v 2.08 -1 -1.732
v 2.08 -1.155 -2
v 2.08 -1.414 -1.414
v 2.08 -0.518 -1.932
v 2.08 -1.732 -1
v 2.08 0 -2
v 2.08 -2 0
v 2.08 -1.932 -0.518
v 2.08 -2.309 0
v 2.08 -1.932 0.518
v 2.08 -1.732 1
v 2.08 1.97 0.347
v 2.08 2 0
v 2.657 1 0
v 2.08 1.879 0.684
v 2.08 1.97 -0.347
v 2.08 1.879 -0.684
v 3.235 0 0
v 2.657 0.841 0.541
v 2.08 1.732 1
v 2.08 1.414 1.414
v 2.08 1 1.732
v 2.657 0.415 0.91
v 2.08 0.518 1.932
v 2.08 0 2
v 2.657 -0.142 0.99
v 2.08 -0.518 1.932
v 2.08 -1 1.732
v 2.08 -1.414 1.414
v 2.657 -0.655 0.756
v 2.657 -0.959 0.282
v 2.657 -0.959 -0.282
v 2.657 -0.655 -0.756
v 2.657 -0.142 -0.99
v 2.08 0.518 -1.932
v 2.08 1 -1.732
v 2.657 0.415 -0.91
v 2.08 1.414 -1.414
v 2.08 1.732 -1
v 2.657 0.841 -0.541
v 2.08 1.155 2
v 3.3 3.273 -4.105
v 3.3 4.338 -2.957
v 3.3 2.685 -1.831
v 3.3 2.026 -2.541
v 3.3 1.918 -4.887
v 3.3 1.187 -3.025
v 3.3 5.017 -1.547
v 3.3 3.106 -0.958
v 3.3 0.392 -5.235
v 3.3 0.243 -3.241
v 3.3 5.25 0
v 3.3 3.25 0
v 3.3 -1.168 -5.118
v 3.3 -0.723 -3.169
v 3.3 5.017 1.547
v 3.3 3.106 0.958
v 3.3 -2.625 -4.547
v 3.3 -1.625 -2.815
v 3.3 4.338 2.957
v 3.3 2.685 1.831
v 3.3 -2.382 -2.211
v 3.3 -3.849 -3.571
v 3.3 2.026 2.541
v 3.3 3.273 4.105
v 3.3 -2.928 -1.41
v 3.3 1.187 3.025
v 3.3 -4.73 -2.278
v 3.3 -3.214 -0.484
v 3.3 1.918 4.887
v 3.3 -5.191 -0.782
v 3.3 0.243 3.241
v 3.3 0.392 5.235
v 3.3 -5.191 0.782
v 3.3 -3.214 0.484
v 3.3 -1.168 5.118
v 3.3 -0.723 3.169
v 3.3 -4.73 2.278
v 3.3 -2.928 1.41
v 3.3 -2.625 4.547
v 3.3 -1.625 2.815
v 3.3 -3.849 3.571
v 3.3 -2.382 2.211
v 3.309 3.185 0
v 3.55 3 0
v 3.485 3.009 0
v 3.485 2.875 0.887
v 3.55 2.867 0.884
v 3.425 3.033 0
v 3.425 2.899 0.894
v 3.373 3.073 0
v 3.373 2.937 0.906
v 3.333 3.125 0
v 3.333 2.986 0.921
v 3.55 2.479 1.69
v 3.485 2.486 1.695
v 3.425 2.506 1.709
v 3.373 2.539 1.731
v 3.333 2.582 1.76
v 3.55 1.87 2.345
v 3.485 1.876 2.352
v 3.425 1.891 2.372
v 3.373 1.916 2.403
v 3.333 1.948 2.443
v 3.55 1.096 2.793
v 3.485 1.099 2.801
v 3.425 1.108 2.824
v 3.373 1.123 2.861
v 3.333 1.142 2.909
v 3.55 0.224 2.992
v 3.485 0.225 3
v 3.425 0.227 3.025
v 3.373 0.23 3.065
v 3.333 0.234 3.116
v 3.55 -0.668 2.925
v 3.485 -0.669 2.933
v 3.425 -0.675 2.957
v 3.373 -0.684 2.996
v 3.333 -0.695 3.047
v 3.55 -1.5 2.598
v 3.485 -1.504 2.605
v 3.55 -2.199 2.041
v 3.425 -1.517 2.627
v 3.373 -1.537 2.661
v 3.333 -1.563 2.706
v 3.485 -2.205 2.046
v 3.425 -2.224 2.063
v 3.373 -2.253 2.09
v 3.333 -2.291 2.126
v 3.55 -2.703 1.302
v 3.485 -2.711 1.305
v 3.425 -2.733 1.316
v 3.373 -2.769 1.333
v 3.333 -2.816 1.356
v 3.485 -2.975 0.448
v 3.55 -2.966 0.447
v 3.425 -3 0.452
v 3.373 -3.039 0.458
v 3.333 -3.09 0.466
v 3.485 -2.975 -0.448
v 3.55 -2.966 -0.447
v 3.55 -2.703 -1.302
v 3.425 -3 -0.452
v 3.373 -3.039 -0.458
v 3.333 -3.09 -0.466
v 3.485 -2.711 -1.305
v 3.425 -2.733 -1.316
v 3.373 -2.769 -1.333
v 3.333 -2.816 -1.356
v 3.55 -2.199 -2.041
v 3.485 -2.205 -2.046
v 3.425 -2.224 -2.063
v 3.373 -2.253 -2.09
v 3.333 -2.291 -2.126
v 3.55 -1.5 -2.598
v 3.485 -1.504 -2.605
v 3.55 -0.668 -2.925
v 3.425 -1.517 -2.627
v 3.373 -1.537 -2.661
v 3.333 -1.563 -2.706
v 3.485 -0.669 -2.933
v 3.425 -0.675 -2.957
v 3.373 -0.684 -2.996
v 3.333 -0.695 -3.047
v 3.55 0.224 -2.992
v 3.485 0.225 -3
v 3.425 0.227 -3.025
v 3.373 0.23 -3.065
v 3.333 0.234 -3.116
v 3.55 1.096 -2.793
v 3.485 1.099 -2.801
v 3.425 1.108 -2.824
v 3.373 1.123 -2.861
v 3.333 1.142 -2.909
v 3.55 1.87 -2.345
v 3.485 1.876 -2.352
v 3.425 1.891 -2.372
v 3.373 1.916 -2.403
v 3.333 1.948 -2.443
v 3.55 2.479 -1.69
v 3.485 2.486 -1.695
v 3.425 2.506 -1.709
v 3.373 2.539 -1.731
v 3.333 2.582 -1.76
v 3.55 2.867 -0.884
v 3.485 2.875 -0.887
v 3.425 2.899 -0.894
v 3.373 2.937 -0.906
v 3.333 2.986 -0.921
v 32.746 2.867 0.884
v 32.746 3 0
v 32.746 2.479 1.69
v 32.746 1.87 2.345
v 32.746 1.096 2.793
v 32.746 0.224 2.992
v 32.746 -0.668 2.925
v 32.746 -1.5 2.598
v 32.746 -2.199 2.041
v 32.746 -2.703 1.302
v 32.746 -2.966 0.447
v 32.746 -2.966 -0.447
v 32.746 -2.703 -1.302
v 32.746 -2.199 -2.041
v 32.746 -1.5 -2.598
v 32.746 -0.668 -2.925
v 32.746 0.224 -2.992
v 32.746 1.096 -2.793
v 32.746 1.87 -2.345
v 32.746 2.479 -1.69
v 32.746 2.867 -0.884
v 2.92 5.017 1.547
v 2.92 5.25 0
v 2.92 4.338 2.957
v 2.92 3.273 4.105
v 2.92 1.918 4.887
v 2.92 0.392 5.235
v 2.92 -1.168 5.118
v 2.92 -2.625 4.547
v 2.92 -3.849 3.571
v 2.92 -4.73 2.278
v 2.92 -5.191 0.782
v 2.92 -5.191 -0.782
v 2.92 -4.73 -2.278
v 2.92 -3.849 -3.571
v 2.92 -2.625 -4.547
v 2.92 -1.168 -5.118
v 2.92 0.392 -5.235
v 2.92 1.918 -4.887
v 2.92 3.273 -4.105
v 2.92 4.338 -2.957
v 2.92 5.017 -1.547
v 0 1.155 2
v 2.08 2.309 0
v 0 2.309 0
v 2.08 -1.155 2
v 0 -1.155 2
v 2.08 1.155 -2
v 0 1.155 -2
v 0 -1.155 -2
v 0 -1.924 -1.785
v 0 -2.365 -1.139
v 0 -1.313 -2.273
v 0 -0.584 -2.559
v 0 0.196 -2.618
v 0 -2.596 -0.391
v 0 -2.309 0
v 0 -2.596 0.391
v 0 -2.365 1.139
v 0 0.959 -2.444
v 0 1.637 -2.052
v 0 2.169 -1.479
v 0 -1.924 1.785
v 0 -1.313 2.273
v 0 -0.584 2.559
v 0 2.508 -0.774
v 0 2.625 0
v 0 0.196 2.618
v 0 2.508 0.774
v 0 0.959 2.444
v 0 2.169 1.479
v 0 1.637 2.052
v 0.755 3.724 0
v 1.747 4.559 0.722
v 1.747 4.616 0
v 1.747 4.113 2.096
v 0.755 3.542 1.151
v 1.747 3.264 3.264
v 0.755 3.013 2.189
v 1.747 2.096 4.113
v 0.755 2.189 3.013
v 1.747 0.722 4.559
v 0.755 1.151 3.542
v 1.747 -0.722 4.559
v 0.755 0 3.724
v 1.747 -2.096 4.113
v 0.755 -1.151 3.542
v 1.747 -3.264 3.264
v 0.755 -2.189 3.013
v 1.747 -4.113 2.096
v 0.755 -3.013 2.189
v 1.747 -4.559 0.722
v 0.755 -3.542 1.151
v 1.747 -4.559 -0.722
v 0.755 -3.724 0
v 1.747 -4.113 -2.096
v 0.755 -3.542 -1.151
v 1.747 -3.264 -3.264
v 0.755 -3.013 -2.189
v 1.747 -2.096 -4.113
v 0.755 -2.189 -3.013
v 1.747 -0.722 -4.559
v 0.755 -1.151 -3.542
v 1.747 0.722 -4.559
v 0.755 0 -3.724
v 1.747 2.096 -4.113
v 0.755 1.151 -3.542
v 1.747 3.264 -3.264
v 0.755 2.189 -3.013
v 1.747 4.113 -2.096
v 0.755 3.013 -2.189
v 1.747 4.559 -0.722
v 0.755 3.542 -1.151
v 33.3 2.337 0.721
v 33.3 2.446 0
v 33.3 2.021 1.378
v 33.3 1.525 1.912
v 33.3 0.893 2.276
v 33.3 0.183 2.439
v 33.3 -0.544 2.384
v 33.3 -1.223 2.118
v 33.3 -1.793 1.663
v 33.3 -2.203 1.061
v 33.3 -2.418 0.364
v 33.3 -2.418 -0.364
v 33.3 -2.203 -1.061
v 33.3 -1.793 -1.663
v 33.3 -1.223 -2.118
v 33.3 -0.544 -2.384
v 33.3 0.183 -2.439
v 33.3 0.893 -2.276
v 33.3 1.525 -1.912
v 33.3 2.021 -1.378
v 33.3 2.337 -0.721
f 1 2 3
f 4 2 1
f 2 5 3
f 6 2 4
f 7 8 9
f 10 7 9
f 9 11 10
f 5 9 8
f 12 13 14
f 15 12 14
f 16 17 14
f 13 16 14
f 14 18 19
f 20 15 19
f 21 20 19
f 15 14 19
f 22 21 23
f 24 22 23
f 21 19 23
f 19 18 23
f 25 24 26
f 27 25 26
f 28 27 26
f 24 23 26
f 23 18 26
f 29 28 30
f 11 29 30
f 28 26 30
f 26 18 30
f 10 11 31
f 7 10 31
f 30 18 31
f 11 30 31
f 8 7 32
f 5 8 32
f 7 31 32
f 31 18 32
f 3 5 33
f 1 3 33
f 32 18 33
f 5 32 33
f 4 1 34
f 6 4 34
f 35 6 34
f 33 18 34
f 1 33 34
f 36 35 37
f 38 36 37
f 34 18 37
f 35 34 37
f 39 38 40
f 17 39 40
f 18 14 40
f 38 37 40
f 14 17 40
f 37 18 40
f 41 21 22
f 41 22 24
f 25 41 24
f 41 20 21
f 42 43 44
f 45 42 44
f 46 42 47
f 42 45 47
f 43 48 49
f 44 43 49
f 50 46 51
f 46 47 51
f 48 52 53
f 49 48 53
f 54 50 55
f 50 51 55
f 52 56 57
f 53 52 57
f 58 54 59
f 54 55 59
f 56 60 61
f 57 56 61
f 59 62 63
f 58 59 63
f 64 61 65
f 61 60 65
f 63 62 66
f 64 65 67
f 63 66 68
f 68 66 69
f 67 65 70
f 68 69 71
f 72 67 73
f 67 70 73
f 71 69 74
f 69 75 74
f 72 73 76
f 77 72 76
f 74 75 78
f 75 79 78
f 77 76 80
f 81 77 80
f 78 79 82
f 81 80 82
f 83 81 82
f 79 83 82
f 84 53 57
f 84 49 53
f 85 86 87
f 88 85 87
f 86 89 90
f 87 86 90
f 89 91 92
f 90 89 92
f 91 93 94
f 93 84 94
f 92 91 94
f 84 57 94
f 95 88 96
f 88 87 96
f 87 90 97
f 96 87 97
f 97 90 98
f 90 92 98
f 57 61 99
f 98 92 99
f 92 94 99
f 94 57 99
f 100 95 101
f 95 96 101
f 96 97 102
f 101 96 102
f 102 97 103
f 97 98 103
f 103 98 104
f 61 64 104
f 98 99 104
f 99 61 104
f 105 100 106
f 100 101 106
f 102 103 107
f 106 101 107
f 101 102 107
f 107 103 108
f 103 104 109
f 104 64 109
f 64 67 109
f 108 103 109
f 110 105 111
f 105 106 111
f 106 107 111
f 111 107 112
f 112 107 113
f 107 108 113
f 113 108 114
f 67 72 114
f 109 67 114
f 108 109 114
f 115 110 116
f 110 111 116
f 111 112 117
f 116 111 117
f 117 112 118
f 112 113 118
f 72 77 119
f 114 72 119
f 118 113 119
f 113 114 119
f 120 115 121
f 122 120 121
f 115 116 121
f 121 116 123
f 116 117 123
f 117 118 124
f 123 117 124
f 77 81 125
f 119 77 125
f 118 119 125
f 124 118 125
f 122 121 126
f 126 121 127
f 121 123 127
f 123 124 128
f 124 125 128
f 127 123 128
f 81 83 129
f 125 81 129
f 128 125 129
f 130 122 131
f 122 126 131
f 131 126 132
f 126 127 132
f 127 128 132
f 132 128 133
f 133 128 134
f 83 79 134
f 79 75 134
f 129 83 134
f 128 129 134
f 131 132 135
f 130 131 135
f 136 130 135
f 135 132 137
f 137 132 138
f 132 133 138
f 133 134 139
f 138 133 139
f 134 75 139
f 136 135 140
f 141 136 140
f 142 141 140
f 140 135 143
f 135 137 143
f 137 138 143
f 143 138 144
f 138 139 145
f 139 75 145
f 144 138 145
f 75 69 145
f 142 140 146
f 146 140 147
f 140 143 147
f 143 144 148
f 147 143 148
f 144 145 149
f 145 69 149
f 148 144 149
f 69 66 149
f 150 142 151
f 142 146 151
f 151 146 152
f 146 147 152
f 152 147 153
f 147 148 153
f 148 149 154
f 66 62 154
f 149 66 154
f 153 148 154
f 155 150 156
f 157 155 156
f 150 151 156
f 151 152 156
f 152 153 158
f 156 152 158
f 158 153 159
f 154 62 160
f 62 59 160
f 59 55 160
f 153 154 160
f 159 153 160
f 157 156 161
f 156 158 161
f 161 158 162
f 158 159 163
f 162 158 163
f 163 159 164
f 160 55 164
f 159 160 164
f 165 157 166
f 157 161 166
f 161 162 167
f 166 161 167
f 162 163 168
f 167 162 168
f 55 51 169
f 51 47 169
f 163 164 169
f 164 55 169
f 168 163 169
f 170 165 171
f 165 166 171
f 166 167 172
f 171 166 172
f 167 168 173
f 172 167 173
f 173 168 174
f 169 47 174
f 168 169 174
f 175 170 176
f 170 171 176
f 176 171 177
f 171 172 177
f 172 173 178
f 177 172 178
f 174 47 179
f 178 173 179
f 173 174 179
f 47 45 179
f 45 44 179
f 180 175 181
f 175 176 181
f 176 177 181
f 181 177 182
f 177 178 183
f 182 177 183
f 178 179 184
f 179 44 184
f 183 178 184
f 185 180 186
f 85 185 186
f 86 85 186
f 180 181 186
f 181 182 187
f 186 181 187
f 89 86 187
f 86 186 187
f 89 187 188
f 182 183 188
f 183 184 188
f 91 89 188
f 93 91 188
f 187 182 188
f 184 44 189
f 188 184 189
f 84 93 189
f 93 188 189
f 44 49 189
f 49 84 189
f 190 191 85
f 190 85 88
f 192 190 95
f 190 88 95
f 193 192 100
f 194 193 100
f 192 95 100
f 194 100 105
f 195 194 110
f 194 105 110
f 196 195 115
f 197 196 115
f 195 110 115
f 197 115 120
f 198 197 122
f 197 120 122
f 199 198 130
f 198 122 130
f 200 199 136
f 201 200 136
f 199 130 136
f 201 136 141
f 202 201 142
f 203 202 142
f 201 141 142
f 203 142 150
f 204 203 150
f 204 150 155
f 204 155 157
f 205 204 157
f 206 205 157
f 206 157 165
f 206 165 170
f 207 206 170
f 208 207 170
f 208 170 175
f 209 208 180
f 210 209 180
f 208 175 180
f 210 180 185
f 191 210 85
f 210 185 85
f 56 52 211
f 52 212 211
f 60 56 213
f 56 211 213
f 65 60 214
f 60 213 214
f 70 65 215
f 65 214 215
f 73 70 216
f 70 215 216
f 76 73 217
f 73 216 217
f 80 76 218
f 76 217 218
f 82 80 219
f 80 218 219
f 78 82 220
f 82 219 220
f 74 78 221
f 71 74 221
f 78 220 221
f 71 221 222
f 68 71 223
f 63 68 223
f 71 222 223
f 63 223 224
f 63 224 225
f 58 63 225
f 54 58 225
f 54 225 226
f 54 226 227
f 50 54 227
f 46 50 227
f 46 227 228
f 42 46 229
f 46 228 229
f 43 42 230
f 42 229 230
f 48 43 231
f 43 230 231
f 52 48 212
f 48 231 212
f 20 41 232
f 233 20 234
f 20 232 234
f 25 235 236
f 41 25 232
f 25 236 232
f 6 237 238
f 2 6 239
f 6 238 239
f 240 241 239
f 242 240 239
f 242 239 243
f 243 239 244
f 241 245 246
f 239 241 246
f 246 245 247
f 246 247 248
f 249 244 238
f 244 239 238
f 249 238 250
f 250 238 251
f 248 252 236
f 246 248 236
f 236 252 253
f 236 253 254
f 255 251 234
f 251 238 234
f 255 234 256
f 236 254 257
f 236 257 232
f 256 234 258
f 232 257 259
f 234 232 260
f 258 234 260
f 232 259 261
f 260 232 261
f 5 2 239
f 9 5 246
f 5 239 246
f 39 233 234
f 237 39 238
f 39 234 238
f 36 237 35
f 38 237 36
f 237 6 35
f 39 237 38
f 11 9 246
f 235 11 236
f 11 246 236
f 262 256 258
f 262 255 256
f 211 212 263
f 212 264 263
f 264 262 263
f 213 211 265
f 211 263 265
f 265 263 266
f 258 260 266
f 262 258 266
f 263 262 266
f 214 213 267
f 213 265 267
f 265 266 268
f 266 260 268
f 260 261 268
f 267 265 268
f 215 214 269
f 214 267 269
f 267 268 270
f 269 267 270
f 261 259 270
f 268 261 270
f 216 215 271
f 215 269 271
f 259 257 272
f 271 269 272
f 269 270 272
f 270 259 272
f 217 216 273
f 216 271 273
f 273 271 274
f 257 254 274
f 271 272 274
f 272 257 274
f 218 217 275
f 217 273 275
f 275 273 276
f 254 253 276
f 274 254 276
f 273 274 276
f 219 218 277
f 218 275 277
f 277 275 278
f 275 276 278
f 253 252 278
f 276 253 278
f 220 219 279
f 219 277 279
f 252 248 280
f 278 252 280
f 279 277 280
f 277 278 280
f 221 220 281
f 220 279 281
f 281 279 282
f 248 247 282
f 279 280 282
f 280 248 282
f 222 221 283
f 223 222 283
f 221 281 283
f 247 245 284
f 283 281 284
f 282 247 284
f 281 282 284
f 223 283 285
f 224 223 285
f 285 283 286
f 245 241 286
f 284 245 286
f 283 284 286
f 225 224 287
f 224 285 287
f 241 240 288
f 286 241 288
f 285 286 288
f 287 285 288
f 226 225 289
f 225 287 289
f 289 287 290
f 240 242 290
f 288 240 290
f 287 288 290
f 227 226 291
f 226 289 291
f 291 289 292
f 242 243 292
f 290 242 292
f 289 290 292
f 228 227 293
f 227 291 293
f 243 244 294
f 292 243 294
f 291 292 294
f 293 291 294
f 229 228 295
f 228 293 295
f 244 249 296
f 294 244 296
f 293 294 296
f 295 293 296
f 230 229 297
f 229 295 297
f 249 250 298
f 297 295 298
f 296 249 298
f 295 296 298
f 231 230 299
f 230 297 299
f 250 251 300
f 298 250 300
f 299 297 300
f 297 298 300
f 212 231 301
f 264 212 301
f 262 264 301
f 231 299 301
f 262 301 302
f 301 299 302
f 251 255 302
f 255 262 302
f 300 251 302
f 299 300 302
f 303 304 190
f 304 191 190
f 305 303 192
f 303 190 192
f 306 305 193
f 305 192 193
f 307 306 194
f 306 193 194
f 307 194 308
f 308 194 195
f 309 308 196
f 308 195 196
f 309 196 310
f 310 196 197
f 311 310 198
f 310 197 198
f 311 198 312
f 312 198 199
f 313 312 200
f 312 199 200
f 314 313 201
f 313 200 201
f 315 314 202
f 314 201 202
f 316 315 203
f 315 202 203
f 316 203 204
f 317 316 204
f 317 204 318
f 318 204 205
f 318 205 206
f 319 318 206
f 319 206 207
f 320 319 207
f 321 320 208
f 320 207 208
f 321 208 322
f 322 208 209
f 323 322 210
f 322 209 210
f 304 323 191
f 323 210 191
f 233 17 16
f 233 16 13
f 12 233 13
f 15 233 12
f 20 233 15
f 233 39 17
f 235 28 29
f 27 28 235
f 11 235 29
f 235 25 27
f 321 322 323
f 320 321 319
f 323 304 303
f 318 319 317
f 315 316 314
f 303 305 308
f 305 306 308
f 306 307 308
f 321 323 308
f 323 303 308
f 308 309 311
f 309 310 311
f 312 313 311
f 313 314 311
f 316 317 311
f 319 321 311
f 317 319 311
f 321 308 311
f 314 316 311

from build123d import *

# Parameters (mm, degrees)
FILLET1_R   = 0.25
HEX_2_DEPTH = 2.08


with BuildPart() as part:
    # BodySke → BaseBody (revolve)
    with BuildSketch(Plane.XY):
        with BuildLine():
            Line((33.3, 0), (33.3, 2.4455))
            Line((33.3, 2.4455), (32.7455, 3))
            Line((32.7455, 3), (3.3, 3))
            Line((3.3, 3), (3.3, 5.25))
            Line((3.3, 5.25), (2.92, 5.25))
            ThreePointArc((2.92, 5.25), (1.224500646, 4.199464996), (0, 2.625))
            Line((0, 2.625), (0, 0))
            Line((0, 0), (33.3, 0))
        make_face()
    revolve(axis=Axis((0, 0, 0), (1, 0, 0)))

    # Fillet1
    fillet1_edges = [part.edges().sort_by_distance(p)[0] for p in [
        (3.3, -3, 0),
    ]]
    fillet(fillet1_edges, radius=FILLET1_R)

    # Sketch2 → PreBroach (revolve, cut)
    with BuildSketch(Plane.XY):
        Polygon((0, 2), (2.08, 2), (3.234700538, 0), (0, 0), align=None)
    revolve(axis=Axis((0, 0, 0), (1, 0, 0)), mode=Mode.SUBTRACT)

    # Sketch3 → Hex 2 (cut)
    with BuildSketch(Plane(origin=(0, 0, 0), x_dir=(0, 0, -1), z_dir=(1, 0, 0))):
        Polygon((-2, -1.154700538), (-2, 1.154700538), (0, 2.309401077), (2, 1.154700538), (2, -1.154700538), (0, -2.309401077), align=None)
    extrude(amount=HEX_2_DEPTH, mode=Mode.SUBTRACT)


solid = part.part
